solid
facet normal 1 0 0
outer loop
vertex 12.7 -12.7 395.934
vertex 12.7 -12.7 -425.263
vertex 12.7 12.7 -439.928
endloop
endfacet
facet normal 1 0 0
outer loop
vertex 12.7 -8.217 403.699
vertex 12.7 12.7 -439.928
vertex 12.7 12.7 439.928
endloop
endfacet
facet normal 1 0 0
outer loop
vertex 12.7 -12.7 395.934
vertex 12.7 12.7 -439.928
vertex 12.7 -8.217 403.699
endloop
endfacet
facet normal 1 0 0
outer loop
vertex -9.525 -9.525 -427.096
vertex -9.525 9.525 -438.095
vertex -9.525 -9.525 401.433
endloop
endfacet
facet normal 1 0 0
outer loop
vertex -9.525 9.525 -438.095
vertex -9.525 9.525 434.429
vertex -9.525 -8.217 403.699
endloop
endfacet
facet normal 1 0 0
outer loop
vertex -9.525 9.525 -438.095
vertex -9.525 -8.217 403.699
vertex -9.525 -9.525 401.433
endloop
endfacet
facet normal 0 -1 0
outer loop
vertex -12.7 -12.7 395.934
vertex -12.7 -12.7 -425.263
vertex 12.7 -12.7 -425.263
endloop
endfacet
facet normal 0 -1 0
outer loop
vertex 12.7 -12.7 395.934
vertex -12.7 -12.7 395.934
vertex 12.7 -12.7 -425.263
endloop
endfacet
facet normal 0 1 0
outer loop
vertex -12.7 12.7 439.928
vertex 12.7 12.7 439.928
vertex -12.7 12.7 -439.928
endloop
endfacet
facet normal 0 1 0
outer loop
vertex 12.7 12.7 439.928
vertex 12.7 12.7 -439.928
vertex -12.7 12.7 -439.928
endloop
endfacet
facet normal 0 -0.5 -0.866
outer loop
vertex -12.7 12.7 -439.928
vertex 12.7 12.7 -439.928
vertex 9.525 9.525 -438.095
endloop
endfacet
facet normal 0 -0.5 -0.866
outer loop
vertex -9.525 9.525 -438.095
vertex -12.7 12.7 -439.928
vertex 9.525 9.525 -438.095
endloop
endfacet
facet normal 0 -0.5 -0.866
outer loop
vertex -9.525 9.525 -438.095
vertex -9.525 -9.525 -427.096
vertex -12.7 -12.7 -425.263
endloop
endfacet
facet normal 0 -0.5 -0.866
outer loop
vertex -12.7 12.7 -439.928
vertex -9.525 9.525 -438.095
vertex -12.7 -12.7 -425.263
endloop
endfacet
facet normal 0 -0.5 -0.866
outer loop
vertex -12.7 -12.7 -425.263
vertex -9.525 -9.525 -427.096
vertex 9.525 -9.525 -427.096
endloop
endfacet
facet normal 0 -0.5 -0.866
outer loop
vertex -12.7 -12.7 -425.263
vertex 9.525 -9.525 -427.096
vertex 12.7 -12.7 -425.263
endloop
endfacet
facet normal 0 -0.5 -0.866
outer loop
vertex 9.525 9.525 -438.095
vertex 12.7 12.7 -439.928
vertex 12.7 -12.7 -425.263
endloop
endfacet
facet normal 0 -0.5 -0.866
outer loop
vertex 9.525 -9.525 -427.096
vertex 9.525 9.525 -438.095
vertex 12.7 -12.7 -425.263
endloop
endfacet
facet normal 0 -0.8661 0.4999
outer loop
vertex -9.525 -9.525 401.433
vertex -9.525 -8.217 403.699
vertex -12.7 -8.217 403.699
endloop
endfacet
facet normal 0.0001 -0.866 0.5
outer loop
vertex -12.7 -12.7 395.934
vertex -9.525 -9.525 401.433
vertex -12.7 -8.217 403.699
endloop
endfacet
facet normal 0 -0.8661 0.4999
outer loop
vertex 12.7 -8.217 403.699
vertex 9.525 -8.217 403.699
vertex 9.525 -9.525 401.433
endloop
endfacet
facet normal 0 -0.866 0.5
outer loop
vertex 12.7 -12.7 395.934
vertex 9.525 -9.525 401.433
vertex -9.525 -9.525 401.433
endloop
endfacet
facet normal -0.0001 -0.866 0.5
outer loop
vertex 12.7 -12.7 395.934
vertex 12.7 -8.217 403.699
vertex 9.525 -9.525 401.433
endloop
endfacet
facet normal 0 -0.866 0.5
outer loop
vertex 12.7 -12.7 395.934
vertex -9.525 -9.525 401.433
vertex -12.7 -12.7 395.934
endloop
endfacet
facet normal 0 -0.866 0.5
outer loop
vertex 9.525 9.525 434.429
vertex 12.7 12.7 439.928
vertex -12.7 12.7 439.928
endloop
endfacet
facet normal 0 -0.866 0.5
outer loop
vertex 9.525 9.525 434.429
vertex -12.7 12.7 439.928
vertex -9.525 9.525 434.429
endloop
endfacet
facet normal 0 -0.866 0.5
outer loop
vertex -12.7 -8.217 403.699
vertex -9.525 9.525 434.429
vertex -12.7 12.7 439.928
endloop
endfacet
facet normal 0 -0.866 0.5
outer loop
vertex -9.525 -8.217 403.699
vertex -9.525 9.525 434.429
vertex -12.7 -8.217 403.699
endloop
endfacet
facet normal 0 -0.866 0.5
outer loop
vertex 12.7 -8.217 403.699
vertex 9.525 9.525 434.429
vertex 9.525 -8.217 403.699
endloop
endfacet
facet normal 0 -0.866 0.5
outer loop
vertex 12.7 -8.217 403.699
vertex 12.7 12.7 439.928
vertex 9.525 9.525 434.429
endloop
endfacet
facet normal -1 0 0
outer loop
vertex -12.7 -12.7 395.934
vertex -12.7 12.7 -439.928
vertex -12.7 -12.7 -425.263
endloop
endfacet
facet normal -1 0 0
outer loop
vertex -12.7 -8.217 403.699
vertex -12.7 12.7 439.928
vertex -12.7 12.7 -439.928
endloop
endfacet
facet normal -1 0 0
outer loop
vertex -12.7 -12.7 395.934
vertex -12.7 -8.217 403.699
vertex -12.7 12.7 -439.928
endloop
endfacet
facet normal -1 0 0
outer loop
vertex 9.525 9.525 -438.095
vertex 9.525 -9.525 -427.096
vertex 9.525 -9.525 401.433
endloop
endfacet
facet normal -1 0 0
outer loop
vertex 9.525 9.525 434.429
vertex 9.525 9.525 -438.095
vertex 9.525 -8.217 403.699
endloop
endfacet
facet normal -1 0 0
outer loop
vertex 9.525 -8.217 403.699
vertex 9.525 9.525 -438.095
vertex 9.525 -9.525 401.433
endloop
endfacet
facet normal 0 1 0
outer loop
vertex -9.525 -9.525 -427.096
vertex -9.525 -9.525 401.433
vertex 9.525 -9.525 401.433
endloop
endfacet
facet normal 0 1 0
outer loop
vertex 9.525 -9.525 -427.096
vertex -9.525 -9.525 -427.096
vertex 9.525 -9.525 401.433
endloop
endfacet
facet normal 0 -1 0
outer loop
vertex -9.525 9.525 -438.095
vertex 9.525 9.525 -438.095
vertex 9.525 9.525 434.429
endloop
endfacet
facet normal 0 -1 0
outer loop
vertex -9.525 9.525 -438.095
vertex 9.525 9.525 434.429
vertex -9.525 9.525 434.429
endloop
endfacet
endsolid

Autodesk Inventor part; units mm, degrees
ref_plane "YZ Plane" through (0, 0, 0) normal (1, 0, 0) x (0, 1, 0)
ref_plane "XZ Plane" through (0, 0, 0) normal (0, 1, 0) x (-1, 0, 0)
ref_plane "XY Plane" through (0, 0, 0) normal (0, 0, 1) x (1, 0, 0)
sketch "Sketch2" plane through (0, 0, 0) normal (0, 0, 1) x (1, 0, 0)
  line L0 (-12.7, -12.7) -> (12.7, -12.7)
  line L1 (12.7, -12.7) -> (12.7, 12.7)
  line L2 (12.7, 12.7) -> (-12.7, 12.7)
  line L3 (-12.7, 12.7) -> (-12.7, -12.7)
  line L4 (-12.7, -12.7) -> (12.7, 12.7) construction
  line L5 (12.7, -12.7) -> (-12.7, 12.7) construction
  line L6 (-9.525, -9.525) -> (9.525, -9.525)
  line L7 (9.525, -9.525) -> (9.525, 9.525)
  line L8 (9.525, 9.525) -> (-9.525, 9.525)
  line L9 (-9.525, 9.525) -> (-9.525, -9.525)
  line L10 (-9.525, -9.525) -> (9.525, 9.525) construction
  line L11 (9.525, -9.525) -> (-9.525, 9.525) construction
  point P0 (0, 0)
  dimension "d0" = 25.4
  dimension "d1" = 25.4
  dimension "d2" = 3.175
  dimension "d3" = 3.175
extrude "Extrusion1" add sketch "Sketch2" along normal mid plane 879.856
sketch "Sketch3" plane through (12.7, -12.7, 439.928) normal (1, 0, 0) x (0, 0, -1)
  line L0 (879.856, 25.4) -> (879.856, 0) projected
  line L1 (879.856, 25.4) -> (865.1913, 0)
  line L2 (879.856, 0) -> (0, 0) projected
  line L3 (865.1913, 0) -> (879.856, 0)
  line L4 (879.856, 25.4) -> (0, 25.4) projected
  line L5 (879.856, 0) -> (879.856, 25.4)
  point P0 (439.928, 12.7)
  dimension "d6" = 30
extrude "Extrusion2" cut sketch "Sketch3" against normal through all
sketch "Sketch4" plane through (12.7, -12.7, 439.928) normal (1, 0, 0) x (0, 0, -1)
  line L0 (0, 25.4) -> (0, 0) projected
  line L1 (0, 25.4) -> (36.2286, 4.4834)
  line L2 (36.2286, 4.4834) -> (43.9941, 0)
  line L3 (865.1913, 0) -> (0, 0) projected
  line L4 (0, 25.4) -> (0, 0)
  line L5 (0, 0) -> (43.9941, 0)
  point P0 (439.928, 12.7)
  dimension "d9" = 60
extrude "Extrusion3" cut sketch "Sketch4" against normal through all
properties part number "aluminumBallHandlerHypotenuse" material "Aluminum 6061-AHC"
